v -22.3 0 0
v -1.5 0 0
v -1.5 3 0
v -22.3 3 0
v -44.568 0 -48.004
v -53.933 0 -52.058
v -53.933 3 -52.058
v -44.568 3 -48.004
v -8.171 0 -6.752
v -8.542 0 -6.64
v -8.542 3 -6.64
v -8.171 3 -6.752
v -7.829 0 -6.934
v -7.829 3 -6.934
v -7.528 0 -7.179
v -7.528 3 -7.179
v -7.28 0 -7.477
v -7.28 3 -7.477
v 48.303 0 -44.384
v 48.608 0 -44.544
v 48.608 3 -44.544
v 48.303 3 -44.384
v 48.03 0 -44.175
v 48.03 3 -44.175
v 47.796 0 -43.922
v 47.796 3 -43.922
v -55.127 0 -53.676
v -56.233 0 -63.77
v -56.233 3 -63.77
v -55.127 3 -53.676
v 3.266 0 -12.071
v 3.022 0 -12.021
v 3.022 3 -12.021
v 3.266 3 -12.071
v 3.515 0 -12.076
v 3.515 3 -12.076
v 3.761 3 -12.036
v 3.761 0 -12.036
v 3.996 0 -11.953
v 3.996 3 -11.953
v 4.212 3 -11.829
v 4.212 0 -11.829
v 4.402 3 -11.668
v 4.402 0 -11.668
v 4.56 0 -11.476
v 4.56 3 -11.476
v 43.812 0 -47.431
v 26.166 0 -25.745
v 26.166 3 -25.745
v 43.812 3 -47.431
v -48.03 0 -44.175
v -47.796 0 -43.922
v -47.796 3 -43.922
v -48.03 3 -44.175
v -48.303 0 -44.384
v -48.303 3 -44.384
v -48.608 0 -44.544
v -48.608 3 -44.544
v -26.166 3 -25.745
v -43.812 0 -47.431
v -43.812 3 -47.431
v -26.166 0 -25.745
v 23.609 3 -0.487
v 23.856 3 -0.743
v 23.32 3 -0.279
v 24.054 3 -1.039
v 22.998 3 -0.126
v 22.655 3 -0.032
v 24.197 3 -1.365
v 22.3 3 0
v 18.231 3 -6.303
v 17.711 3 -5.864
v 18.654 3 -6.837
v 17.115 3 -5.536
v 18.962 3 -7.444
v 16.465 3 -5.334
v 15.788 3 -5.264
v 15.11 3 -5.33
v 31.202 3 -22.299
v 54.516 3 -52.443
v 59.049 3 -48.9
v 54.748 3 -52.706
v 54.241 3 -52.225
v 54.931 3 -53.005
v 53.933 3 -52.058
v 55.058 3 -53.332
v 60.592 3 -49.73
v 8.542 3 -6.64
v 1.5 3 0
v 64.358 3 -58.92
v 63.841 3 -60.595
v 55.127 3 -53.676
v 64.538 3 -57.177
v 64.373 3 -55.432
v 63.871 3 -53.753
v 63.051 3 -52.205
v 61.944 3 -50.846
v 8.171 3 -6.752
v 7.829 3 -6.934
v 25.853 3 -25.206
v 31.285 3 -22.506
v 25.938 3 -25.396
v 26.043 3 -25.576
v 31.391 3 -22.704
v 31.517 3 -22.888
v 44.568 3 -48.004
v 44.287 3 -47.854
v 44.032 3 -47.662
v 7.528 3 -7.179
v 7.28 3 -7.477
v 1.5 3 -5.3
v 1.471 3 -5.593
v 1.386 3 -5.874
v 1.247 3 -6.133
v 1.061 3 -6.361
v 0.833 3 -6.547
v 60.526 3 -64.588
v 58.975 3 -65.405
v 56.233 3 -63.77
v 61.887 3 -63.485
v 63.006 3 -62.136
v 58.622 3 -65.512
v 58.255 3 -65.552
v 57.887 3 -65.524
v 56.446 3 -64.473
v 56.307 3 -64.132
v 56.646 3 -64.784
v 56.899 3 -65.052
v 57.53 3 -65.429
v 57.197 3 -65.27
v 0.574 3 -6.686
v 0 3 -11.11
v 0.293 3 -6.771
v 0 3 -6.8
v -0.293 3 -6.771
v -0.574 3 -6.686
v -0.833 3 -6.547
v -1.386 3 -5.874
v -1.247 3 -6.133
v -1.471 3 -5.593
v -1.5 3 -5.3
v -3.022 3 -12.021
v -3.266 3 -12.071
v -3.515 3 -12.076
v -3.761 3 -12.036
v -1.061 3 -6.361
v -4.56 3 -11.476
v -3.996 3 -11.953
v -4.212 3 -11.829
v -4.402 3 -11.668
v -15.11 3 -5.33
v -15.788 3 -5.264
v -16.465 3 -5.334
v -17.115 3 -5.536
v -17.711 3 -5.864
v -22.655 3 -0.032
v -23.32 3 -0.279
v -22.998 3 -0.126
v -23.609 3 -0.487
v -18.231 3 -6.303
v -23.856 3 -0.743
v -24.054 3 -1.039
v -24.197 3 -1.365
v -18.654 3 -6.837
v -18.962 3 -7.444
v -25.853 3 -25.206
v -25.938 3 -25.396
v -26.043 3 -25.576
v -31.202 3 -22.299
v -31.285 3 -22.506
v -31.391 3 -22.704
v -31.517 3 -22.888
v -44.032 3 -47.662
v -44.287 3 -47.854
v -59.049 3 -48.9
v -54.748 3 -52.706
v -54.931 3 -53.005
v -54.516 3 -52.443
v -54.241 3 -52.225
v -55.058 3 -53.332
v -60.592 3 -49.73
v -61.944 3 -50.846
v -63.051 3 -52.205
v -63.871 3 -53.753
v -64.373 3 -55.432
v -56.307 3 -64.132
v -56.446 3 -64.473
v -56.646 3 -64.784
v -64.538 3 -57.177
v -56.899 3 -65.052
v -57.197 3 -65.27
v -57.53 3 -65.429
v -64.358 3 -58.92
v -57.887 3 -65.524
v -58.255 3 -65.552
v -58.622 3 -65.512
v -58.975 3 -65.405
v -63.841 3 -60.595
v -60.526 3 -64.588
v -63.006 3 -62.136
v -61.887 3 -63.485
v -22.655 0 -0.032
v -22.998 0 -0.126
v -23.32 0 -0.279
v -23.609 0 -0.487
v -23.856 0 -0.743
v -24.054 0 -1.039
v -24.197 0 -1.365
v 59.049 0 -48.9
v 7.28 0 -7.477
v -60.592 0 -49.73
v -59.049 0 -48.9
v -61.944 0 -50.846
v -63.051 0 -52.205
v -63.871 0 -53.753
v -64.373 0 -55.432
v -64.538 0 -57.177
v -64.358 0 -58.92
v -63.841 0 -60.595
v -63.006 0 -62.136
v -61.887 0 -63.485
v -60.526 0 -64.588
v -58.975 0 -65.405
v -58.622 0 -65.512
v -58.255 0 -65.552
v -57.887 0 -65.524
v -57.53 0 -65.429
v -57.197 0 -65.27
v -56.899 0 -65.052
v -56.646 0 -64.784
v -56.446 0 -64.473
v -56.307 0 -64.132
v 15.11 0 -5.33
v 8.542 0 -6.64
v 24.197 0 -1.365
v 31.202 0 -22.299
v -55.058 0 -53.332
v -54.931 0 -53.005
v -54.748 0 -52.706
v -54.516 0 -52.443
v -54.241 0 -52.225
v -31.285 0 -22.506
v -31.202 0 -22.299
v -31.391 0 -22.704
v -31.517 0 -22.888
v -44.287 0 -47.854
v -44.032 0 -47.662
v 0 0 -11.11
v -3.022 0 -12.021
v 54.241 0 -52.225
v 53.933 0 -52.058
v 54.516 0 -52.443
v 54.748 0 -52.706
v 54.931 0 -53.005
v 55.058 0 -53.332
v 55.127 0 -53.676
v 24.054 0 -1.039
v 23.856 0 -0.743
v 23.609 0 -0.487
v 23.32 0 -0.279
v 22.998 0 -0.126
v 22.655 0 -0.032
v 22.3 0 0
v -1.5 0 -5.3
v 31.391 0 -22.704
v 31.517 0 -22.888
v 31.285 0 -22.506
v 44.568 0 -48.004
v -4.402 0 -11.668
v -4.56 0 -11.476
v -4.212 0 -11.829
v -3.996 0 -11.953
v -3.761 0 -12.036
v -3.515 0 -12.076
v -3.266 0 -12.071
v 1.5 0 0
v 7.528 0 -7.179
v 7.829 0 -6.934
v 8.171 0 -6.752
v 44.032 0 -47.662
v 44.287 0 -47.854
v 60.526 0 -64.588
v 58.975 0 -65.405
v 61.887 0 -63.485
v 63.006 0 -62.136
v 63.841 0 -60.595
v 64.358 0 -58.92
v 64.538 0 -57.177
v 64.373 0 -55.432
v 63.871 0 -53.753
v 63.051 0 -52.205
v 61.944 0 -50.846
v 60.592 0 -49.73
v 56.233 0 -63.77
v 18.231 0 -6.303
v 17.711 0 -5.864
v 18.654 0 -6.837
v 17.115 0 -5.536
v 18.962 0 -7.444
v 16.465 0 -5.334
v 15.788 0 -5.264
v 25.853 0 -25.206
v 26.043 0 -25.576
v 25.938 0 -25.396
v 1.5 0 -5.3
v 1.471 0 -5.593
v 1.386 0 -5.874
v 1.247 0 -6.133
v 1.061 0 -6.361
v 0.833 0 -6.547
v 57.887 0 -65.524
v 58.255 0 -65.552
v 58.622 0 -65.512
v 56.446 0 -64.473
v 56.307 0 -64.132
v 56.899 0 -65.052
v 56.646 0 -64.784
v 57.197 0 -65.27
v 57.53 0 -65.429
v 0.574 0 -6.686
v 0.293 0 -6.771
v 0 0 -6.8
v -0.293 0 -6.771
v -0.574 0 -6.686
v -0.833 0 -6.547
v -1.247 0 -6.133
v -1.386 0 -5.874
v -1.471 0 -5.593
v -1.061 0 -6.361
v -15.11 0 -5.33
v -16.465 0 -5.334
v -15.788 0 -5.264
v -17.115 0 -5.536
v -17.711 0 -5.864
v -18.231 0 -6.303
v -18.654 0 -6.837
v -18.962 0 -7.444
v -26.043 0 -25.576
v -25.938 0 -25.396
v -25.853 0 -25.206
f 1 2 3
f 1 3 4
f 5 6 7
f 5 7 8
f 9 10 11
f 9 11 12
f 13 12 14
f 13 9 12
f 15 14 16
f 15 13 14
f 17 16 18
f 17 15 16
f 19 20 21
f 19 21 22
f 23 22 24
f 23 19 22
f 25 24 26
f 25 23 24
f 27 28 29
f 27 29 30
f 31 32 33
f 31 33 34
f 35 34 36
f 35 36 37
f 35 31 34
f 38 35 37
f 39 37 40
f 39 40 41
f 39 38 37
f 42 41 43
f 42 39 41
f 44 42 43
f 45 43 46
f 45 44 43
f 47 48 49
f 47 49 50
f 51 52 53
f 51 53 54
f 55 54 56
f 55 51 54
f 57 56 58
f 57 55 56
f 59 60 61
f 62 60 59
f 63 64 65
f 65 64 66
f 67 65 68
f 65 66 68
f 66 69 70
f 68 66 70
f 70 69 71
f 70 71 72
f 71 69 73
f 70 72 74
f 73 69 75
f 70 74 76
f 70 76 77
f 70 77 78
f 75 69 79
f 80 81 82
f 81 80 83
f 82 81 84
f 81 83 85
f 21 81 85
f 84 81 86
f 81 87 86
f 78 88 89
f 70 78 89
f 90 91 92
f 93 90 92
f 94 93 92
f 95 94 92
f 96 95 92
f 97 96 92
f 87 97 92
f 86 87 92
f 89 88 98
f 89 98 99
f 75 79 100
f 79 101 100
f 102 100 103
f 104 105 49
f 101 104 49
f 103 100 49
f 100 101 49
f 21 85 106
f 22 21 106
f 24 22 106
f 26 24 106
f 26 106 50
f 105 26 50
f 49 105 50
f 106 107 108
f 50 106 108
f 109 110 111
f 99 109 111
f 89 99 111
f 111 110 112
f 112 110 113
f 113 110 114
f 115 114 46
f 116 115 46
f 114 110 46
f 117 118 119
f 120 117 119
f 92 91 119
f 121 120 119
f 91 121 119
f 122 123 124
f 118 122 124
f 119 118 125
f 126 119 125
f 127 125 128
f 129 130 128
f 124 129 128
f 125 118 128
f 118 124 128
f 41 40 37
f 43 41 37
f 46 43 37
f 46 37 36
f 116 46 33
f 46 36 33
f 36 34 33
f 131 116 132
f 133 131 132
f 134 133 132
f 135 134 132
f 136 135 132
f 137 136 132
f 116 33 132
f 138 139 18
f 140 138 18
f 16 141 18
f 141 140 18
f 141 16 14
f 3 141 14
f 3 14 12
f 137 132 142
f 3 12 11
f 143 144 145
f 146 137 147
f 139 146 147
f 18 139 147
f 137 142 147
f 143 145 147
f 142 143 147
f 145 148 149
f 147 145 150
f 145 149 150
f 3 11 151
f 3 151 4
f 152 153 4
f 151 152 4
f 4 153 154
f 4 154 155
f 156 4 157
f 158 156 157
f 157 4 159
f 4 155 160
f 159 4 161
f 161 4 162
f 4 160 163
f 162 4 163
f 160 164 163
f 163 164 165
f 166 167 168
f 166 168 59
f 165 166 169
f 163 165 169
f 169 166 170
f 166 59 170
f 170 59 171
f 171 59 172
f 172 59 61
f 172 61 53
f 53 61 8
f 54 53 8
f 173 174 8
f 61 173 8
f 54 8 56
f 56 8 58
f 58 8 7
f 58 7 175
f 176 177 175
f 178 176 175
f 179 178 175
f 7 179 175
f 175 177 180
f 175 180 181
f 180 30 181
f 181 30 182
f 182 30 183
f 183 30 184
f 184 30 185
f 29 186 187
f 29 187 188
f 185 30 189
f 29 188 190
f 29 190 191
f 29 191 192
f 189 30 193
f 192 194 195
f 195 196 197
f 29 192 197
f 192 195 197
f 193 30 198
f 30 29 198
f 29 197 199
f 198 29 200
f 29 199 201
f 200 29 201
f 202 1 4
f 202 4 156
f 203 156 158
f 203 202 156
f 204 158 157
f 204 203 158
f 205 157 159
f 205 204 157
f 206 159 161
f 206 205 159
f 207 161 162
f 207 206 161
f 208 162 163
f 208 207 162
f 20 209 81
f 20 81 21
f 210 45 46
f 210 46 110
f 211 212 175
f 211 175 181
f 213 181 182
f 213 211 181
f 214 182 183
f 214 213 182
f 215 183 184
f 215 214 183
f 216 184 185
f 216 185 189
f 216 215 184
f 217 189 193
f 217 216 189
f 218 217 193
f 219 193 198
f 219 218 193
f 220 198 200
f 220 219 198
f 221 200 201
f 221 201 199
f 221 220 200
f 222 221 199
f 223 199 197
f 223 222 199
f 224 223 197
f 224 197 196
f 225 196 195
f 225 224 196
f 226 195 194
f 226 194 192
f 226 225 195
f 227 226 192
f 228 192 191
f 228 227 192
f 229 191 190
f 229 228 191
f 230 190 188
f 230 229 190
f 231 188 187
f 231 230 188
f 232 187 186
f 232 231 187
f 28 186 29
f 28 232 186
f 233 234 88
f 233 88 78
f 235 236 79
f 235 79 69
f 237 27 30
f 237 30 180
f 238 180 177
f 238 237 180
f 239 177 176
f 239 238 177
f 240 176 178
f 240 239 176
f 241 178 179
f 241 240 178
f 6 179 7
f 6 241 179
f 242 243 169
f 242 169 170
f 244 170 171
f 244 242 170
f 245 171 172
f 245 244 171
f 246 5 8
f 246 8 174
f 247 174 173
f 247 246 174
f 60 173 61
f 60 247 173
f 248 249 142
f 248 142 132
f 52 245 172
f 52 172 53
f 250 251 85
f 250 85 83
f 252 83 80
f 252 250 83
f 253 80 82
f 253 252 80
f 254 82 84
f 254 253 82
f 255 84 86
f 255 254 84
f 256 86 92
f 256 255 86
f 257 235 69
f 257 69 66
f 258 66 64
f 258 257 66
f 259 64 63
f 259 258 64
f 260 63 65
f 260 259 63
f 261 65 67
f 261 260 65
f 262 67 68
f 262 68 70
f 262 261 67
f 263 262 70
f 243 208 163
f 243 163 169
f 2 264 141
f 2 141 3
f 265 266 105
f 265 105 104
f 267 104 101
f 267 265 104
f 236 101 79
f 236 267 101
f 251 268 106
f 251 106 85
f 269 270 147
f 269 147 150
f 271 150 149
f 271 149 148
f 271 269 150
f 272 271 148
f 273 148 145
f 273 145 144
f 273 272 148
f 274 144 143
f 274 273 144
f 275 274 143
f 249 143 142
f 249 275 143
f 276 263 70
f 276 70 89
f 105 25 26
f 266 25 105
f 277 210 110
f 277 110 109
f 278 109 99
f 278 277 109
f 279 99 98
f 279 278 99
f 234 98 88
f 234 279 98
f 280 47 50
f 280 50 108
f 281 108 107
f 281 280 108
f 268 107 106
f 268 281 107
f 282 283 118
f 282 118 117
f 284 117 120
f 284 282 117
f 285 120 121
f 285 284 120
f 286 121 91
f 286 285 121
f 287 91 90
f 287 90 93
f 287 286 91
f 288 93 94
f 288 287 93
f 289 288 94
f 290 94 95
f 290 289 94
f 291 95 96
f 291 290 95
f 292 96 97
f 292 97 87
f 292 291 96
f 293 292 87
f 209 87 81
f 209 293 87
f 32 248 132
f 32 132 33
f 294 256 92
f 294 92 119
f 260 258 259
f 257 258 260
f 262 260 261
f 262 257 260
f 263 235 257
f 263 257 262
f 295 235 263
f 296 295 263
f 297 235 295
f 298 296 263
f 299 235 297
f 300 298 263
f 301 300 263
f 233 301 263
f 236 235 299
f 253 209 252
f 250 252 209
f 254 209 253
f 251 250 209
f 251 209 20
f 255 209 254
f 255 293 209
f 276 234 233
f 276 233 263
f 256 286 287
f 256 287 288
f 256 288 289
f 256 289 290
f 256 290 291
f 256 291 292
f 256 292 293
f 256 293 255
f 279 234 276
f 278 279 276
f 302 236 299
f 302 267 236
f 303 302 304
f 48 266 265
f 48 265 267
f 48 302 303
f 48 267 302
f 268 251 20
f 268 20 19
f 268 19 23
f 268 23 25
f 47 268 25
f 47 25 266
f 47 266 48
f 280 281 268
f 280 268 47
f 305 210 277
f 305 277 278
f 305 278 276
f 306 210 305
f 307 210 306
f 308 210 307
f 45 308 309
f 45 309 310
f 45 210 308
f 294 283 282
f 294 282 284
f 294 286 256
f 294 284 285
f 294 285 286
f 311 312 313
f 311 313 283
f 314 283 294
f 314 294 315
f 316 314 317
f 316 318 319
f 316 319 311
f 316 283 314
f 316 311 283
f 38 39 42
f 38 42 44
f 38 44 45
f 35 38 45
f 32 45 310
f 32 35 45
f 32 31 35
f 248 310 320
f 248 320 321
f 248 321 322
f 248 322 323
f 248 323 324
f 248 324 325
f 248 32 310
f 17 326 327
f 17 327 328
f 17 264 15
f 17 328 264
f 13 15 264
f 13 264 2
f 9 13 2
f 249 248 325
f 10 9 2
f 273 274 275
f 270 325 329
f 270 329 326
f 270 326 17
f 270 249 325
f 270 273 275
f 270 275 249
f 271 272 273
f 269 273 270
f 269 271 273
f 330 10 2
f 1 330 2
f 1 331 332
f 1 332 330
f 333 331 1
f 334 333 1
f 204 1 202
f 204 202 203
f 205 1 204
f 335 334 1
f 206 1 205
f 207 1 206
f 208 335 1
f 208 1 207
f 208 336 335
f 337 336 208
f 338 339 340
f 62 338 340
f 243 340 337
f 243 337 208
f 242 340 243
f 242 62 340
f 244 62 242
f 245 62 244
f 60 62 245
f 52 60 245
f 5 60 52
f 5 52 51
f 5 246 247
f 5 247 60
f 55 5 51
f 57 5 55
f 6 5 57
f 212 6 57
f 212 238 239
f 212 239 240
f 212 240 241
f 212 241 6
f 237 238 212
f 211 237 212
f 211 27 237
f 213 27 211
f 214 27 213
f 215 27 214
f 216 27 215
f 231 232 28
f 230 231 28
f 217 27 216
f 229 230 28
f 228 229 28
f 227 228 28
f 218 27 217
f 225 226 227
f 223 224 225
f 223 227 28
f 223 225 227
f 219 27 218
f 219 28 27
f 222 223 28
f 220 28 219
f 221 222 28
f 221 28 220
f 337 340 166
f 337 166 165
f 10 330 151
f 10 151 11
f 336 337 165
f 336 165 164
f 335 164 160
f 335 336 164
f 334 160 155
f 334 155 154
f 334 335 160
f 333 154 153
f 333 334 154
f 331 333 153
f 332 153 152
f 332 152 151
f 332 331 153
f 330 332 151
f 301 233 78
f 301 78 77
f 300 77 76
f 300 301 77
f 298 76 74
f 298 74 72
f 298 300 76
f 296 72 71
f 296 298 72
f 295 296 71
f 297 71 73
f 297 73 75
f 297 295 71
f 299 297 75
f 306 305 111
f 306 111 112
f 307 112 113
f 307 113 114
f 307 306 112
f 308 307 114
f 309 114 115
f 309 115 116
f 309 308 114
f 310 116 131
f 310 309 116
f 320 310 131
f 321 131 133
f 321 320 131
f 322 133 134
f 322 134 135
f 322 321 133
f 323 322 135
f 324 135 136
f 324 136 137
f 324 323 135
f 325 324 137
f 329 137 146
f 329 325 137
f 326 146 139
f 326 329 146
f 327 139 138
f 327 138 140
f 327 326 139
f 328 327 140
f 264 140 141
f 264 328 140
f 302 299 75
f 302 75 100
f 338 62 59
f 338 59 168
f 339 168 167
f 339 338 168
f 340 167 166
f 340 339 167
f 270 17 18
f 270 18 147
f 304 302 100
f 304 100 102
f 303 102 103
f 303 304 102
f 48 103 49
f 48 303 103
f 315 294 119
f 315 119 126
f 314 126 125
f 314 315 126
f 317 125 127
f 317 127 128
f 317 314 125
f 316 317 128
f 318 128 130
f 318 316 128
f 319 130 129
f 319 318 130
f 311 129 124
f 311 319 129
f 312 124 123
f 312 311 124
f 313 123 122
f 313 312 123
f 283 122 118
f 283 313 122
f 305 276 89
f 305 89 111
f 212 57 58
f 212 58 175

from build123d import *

# Parameters (mm, degrees)
BOSS_EXTRUDE16_DEPTH = 3


with BuildPart() as part:
    # Sketch1 → Boss-Extrude16 (new body)
    with BuildSketch(Plane(origin=(0, 0, 0), x_dir=(1, 0, 0), z_dir=(0, 1, 0))):
        with BuildLine():
            Line((22.300293778, 0), (1.5, 0))
            Line((1.5, 0), (1.5, 5.3))
            ThreePointArc((1.5, 5.3), (0, 6.8), (-1.5, 5.3))
            Line((-1.5, 5.3), (-1.5, 0))
            Line((-1.5, 0), (-22.300293778, 0))
            ThreePointArc((-22.300293778, 0), (-23.468746199, 0.376818266), (-24.196904404, 1.365281059))
            Line((-24.196904404, 1.365281059), (-31.202449054, 22.298625838))
            ThreePointArc((-31.202449054, 22.298625838), (-31.335143696, 22.606562933), (-31.517418983, 22.888003588))
            Line((-31.517418983, 22.888003588), (-47.796410522, 43.921893905))
            ThreePointArc((-47.796410522, 43.921893905), (-48.161779402, 44.28546307), (-48.607932132, 44.543580677))
            Line((-48.607932132, 44.543580677), (-59.049183209, 48.9))
            ThreePointArc((-59.049183209, 48.9), (-64.537582367, 57.177202895), (-58.974890206, 65.404661131))
            ThreePointArc((-58.974890206, 65.404661131), (-57.197152686, 65.269831628), (-56.233330362, 63.769972896))
            Line((-56.233330362, 63.769972896), (-55.126688169, 53.675601541))
            ThreePointArc((-55.126688169, 53.675601541), (-54.747886441, 52.70603833), (-53.9331516, 52.058156621))
            Line((-53.9331516, 52.058156621), (-44.568394969, 48.00411216))
            ThreePointArc((-44.568394969, 48.00411216), (-44.155510387, 47.763109259), (-43.811617548, 47.431004165))
            Line((-43.811617548, 47.431004165), (-26.165884896, 25.744753421))
            ThreePointArc((-26.165884896, 25.744753421), (-25.988120723, 25.487567655), (-25.85260895, 25.205820999))
            Line((-25.85260895, 25.205820999), (-18.96208022, 7.444050869))
            ThreePointArc((-18.96208022, 7.444050869), (-17.421166495, 5.685274236), (-15.11, 5.33))
            Line((-15.11, 5.33), (-8.5424724, 6.639941055))
            ThreePointArc((-8.5424724, 6.639941055), (-7.828892036, 6.934141221), (-7.279856371, 7.476645151))
            Line((-7.279856371, 7.476645151), (-4.560453498, 11.47555039))
            ThreePointArc((-4.560453498, 11.47555039), (-3.880556824, 12), (-3.022136693, 12.020536776))
            Line((-3.022136693, 12.020536776), (0, 11.11))
            Line((0, 11.11), (3.022136693, 12.020536776))
            ThreePointArc((3.022136693, 12.020536776), (3.880556824, 12), (4.560453498, 11.47555039))
            Line((4.560453498, 11.47555039), (7.279856371, 7.476645151))
            ThreePointArc((7.279856371, 7.476645151), (7.828892036, 6.934141221), (8.5424724, 6.639941055))
            Line((8.5424724, 6.639941055), (15.11, 5.33))
            ThreePointArc((15.11, 5.33), (17.421166495, 5.685274236), (18.96208022, 7.444050869))
            Line((18.96208022, 7.444050869), (25.85260895, 25.205820999))
            ThreePointArc((25.85260895, 25.205820999), (25.988120723, 25.487567655), (26.165884896, 25.744753421))
            Line((26.165884896, 25.744753421), (43.811617548, 47.431004165))
            ThreePointArc((43.811617548, 47.431004165), (44.155510387, 47.763109259), (44.568394969, 48.00411216))
            Line((44.568394969, 48.00411216), (53.9331516, 52.058156621))
            ThreePointArc((53.9331516, 52.058156621), (54.747886441, 52.70603833), (55.126688169, 53.675601541))
            Line((55.126688169, 53.675601541), (56.233330362, 63.769972896))
            ThreePointArc((56.233330362, 63.769972896), (57.197152686, 65.269831628), (58.974890206, 65.404661131))
            ThreePointArc((58.974890206, 65.404661131), (64.537582367, 57.177202895), (59.049183209, 48.9))
            Line((59.049183209, 48.9), (48.607932132, 44.543580677))
            ThreePointArc((48.607932132, 44.543580677), (48.161779402, 44.28546307), (47.796410522, 43.921893905))
            Line((47.796410522, 43.921893905), (31.517418983, 22.888003588))
            ThreePointArc((31.517418983, 22.888003588), (31.335143696, 22.606562933), (31.202449054, 22.298625838))
            Line((31.202449054, 22.298625838), (24.196904404, 1.365281059))
            ThreePointArc((24.196904404, 1.365281059), (23.468746199, 0.376818266), (22.300293778, 0))
        make_face()
    extrude(amount=BOSS_EXTRUDE16_DEPTH)


solid = part.part
